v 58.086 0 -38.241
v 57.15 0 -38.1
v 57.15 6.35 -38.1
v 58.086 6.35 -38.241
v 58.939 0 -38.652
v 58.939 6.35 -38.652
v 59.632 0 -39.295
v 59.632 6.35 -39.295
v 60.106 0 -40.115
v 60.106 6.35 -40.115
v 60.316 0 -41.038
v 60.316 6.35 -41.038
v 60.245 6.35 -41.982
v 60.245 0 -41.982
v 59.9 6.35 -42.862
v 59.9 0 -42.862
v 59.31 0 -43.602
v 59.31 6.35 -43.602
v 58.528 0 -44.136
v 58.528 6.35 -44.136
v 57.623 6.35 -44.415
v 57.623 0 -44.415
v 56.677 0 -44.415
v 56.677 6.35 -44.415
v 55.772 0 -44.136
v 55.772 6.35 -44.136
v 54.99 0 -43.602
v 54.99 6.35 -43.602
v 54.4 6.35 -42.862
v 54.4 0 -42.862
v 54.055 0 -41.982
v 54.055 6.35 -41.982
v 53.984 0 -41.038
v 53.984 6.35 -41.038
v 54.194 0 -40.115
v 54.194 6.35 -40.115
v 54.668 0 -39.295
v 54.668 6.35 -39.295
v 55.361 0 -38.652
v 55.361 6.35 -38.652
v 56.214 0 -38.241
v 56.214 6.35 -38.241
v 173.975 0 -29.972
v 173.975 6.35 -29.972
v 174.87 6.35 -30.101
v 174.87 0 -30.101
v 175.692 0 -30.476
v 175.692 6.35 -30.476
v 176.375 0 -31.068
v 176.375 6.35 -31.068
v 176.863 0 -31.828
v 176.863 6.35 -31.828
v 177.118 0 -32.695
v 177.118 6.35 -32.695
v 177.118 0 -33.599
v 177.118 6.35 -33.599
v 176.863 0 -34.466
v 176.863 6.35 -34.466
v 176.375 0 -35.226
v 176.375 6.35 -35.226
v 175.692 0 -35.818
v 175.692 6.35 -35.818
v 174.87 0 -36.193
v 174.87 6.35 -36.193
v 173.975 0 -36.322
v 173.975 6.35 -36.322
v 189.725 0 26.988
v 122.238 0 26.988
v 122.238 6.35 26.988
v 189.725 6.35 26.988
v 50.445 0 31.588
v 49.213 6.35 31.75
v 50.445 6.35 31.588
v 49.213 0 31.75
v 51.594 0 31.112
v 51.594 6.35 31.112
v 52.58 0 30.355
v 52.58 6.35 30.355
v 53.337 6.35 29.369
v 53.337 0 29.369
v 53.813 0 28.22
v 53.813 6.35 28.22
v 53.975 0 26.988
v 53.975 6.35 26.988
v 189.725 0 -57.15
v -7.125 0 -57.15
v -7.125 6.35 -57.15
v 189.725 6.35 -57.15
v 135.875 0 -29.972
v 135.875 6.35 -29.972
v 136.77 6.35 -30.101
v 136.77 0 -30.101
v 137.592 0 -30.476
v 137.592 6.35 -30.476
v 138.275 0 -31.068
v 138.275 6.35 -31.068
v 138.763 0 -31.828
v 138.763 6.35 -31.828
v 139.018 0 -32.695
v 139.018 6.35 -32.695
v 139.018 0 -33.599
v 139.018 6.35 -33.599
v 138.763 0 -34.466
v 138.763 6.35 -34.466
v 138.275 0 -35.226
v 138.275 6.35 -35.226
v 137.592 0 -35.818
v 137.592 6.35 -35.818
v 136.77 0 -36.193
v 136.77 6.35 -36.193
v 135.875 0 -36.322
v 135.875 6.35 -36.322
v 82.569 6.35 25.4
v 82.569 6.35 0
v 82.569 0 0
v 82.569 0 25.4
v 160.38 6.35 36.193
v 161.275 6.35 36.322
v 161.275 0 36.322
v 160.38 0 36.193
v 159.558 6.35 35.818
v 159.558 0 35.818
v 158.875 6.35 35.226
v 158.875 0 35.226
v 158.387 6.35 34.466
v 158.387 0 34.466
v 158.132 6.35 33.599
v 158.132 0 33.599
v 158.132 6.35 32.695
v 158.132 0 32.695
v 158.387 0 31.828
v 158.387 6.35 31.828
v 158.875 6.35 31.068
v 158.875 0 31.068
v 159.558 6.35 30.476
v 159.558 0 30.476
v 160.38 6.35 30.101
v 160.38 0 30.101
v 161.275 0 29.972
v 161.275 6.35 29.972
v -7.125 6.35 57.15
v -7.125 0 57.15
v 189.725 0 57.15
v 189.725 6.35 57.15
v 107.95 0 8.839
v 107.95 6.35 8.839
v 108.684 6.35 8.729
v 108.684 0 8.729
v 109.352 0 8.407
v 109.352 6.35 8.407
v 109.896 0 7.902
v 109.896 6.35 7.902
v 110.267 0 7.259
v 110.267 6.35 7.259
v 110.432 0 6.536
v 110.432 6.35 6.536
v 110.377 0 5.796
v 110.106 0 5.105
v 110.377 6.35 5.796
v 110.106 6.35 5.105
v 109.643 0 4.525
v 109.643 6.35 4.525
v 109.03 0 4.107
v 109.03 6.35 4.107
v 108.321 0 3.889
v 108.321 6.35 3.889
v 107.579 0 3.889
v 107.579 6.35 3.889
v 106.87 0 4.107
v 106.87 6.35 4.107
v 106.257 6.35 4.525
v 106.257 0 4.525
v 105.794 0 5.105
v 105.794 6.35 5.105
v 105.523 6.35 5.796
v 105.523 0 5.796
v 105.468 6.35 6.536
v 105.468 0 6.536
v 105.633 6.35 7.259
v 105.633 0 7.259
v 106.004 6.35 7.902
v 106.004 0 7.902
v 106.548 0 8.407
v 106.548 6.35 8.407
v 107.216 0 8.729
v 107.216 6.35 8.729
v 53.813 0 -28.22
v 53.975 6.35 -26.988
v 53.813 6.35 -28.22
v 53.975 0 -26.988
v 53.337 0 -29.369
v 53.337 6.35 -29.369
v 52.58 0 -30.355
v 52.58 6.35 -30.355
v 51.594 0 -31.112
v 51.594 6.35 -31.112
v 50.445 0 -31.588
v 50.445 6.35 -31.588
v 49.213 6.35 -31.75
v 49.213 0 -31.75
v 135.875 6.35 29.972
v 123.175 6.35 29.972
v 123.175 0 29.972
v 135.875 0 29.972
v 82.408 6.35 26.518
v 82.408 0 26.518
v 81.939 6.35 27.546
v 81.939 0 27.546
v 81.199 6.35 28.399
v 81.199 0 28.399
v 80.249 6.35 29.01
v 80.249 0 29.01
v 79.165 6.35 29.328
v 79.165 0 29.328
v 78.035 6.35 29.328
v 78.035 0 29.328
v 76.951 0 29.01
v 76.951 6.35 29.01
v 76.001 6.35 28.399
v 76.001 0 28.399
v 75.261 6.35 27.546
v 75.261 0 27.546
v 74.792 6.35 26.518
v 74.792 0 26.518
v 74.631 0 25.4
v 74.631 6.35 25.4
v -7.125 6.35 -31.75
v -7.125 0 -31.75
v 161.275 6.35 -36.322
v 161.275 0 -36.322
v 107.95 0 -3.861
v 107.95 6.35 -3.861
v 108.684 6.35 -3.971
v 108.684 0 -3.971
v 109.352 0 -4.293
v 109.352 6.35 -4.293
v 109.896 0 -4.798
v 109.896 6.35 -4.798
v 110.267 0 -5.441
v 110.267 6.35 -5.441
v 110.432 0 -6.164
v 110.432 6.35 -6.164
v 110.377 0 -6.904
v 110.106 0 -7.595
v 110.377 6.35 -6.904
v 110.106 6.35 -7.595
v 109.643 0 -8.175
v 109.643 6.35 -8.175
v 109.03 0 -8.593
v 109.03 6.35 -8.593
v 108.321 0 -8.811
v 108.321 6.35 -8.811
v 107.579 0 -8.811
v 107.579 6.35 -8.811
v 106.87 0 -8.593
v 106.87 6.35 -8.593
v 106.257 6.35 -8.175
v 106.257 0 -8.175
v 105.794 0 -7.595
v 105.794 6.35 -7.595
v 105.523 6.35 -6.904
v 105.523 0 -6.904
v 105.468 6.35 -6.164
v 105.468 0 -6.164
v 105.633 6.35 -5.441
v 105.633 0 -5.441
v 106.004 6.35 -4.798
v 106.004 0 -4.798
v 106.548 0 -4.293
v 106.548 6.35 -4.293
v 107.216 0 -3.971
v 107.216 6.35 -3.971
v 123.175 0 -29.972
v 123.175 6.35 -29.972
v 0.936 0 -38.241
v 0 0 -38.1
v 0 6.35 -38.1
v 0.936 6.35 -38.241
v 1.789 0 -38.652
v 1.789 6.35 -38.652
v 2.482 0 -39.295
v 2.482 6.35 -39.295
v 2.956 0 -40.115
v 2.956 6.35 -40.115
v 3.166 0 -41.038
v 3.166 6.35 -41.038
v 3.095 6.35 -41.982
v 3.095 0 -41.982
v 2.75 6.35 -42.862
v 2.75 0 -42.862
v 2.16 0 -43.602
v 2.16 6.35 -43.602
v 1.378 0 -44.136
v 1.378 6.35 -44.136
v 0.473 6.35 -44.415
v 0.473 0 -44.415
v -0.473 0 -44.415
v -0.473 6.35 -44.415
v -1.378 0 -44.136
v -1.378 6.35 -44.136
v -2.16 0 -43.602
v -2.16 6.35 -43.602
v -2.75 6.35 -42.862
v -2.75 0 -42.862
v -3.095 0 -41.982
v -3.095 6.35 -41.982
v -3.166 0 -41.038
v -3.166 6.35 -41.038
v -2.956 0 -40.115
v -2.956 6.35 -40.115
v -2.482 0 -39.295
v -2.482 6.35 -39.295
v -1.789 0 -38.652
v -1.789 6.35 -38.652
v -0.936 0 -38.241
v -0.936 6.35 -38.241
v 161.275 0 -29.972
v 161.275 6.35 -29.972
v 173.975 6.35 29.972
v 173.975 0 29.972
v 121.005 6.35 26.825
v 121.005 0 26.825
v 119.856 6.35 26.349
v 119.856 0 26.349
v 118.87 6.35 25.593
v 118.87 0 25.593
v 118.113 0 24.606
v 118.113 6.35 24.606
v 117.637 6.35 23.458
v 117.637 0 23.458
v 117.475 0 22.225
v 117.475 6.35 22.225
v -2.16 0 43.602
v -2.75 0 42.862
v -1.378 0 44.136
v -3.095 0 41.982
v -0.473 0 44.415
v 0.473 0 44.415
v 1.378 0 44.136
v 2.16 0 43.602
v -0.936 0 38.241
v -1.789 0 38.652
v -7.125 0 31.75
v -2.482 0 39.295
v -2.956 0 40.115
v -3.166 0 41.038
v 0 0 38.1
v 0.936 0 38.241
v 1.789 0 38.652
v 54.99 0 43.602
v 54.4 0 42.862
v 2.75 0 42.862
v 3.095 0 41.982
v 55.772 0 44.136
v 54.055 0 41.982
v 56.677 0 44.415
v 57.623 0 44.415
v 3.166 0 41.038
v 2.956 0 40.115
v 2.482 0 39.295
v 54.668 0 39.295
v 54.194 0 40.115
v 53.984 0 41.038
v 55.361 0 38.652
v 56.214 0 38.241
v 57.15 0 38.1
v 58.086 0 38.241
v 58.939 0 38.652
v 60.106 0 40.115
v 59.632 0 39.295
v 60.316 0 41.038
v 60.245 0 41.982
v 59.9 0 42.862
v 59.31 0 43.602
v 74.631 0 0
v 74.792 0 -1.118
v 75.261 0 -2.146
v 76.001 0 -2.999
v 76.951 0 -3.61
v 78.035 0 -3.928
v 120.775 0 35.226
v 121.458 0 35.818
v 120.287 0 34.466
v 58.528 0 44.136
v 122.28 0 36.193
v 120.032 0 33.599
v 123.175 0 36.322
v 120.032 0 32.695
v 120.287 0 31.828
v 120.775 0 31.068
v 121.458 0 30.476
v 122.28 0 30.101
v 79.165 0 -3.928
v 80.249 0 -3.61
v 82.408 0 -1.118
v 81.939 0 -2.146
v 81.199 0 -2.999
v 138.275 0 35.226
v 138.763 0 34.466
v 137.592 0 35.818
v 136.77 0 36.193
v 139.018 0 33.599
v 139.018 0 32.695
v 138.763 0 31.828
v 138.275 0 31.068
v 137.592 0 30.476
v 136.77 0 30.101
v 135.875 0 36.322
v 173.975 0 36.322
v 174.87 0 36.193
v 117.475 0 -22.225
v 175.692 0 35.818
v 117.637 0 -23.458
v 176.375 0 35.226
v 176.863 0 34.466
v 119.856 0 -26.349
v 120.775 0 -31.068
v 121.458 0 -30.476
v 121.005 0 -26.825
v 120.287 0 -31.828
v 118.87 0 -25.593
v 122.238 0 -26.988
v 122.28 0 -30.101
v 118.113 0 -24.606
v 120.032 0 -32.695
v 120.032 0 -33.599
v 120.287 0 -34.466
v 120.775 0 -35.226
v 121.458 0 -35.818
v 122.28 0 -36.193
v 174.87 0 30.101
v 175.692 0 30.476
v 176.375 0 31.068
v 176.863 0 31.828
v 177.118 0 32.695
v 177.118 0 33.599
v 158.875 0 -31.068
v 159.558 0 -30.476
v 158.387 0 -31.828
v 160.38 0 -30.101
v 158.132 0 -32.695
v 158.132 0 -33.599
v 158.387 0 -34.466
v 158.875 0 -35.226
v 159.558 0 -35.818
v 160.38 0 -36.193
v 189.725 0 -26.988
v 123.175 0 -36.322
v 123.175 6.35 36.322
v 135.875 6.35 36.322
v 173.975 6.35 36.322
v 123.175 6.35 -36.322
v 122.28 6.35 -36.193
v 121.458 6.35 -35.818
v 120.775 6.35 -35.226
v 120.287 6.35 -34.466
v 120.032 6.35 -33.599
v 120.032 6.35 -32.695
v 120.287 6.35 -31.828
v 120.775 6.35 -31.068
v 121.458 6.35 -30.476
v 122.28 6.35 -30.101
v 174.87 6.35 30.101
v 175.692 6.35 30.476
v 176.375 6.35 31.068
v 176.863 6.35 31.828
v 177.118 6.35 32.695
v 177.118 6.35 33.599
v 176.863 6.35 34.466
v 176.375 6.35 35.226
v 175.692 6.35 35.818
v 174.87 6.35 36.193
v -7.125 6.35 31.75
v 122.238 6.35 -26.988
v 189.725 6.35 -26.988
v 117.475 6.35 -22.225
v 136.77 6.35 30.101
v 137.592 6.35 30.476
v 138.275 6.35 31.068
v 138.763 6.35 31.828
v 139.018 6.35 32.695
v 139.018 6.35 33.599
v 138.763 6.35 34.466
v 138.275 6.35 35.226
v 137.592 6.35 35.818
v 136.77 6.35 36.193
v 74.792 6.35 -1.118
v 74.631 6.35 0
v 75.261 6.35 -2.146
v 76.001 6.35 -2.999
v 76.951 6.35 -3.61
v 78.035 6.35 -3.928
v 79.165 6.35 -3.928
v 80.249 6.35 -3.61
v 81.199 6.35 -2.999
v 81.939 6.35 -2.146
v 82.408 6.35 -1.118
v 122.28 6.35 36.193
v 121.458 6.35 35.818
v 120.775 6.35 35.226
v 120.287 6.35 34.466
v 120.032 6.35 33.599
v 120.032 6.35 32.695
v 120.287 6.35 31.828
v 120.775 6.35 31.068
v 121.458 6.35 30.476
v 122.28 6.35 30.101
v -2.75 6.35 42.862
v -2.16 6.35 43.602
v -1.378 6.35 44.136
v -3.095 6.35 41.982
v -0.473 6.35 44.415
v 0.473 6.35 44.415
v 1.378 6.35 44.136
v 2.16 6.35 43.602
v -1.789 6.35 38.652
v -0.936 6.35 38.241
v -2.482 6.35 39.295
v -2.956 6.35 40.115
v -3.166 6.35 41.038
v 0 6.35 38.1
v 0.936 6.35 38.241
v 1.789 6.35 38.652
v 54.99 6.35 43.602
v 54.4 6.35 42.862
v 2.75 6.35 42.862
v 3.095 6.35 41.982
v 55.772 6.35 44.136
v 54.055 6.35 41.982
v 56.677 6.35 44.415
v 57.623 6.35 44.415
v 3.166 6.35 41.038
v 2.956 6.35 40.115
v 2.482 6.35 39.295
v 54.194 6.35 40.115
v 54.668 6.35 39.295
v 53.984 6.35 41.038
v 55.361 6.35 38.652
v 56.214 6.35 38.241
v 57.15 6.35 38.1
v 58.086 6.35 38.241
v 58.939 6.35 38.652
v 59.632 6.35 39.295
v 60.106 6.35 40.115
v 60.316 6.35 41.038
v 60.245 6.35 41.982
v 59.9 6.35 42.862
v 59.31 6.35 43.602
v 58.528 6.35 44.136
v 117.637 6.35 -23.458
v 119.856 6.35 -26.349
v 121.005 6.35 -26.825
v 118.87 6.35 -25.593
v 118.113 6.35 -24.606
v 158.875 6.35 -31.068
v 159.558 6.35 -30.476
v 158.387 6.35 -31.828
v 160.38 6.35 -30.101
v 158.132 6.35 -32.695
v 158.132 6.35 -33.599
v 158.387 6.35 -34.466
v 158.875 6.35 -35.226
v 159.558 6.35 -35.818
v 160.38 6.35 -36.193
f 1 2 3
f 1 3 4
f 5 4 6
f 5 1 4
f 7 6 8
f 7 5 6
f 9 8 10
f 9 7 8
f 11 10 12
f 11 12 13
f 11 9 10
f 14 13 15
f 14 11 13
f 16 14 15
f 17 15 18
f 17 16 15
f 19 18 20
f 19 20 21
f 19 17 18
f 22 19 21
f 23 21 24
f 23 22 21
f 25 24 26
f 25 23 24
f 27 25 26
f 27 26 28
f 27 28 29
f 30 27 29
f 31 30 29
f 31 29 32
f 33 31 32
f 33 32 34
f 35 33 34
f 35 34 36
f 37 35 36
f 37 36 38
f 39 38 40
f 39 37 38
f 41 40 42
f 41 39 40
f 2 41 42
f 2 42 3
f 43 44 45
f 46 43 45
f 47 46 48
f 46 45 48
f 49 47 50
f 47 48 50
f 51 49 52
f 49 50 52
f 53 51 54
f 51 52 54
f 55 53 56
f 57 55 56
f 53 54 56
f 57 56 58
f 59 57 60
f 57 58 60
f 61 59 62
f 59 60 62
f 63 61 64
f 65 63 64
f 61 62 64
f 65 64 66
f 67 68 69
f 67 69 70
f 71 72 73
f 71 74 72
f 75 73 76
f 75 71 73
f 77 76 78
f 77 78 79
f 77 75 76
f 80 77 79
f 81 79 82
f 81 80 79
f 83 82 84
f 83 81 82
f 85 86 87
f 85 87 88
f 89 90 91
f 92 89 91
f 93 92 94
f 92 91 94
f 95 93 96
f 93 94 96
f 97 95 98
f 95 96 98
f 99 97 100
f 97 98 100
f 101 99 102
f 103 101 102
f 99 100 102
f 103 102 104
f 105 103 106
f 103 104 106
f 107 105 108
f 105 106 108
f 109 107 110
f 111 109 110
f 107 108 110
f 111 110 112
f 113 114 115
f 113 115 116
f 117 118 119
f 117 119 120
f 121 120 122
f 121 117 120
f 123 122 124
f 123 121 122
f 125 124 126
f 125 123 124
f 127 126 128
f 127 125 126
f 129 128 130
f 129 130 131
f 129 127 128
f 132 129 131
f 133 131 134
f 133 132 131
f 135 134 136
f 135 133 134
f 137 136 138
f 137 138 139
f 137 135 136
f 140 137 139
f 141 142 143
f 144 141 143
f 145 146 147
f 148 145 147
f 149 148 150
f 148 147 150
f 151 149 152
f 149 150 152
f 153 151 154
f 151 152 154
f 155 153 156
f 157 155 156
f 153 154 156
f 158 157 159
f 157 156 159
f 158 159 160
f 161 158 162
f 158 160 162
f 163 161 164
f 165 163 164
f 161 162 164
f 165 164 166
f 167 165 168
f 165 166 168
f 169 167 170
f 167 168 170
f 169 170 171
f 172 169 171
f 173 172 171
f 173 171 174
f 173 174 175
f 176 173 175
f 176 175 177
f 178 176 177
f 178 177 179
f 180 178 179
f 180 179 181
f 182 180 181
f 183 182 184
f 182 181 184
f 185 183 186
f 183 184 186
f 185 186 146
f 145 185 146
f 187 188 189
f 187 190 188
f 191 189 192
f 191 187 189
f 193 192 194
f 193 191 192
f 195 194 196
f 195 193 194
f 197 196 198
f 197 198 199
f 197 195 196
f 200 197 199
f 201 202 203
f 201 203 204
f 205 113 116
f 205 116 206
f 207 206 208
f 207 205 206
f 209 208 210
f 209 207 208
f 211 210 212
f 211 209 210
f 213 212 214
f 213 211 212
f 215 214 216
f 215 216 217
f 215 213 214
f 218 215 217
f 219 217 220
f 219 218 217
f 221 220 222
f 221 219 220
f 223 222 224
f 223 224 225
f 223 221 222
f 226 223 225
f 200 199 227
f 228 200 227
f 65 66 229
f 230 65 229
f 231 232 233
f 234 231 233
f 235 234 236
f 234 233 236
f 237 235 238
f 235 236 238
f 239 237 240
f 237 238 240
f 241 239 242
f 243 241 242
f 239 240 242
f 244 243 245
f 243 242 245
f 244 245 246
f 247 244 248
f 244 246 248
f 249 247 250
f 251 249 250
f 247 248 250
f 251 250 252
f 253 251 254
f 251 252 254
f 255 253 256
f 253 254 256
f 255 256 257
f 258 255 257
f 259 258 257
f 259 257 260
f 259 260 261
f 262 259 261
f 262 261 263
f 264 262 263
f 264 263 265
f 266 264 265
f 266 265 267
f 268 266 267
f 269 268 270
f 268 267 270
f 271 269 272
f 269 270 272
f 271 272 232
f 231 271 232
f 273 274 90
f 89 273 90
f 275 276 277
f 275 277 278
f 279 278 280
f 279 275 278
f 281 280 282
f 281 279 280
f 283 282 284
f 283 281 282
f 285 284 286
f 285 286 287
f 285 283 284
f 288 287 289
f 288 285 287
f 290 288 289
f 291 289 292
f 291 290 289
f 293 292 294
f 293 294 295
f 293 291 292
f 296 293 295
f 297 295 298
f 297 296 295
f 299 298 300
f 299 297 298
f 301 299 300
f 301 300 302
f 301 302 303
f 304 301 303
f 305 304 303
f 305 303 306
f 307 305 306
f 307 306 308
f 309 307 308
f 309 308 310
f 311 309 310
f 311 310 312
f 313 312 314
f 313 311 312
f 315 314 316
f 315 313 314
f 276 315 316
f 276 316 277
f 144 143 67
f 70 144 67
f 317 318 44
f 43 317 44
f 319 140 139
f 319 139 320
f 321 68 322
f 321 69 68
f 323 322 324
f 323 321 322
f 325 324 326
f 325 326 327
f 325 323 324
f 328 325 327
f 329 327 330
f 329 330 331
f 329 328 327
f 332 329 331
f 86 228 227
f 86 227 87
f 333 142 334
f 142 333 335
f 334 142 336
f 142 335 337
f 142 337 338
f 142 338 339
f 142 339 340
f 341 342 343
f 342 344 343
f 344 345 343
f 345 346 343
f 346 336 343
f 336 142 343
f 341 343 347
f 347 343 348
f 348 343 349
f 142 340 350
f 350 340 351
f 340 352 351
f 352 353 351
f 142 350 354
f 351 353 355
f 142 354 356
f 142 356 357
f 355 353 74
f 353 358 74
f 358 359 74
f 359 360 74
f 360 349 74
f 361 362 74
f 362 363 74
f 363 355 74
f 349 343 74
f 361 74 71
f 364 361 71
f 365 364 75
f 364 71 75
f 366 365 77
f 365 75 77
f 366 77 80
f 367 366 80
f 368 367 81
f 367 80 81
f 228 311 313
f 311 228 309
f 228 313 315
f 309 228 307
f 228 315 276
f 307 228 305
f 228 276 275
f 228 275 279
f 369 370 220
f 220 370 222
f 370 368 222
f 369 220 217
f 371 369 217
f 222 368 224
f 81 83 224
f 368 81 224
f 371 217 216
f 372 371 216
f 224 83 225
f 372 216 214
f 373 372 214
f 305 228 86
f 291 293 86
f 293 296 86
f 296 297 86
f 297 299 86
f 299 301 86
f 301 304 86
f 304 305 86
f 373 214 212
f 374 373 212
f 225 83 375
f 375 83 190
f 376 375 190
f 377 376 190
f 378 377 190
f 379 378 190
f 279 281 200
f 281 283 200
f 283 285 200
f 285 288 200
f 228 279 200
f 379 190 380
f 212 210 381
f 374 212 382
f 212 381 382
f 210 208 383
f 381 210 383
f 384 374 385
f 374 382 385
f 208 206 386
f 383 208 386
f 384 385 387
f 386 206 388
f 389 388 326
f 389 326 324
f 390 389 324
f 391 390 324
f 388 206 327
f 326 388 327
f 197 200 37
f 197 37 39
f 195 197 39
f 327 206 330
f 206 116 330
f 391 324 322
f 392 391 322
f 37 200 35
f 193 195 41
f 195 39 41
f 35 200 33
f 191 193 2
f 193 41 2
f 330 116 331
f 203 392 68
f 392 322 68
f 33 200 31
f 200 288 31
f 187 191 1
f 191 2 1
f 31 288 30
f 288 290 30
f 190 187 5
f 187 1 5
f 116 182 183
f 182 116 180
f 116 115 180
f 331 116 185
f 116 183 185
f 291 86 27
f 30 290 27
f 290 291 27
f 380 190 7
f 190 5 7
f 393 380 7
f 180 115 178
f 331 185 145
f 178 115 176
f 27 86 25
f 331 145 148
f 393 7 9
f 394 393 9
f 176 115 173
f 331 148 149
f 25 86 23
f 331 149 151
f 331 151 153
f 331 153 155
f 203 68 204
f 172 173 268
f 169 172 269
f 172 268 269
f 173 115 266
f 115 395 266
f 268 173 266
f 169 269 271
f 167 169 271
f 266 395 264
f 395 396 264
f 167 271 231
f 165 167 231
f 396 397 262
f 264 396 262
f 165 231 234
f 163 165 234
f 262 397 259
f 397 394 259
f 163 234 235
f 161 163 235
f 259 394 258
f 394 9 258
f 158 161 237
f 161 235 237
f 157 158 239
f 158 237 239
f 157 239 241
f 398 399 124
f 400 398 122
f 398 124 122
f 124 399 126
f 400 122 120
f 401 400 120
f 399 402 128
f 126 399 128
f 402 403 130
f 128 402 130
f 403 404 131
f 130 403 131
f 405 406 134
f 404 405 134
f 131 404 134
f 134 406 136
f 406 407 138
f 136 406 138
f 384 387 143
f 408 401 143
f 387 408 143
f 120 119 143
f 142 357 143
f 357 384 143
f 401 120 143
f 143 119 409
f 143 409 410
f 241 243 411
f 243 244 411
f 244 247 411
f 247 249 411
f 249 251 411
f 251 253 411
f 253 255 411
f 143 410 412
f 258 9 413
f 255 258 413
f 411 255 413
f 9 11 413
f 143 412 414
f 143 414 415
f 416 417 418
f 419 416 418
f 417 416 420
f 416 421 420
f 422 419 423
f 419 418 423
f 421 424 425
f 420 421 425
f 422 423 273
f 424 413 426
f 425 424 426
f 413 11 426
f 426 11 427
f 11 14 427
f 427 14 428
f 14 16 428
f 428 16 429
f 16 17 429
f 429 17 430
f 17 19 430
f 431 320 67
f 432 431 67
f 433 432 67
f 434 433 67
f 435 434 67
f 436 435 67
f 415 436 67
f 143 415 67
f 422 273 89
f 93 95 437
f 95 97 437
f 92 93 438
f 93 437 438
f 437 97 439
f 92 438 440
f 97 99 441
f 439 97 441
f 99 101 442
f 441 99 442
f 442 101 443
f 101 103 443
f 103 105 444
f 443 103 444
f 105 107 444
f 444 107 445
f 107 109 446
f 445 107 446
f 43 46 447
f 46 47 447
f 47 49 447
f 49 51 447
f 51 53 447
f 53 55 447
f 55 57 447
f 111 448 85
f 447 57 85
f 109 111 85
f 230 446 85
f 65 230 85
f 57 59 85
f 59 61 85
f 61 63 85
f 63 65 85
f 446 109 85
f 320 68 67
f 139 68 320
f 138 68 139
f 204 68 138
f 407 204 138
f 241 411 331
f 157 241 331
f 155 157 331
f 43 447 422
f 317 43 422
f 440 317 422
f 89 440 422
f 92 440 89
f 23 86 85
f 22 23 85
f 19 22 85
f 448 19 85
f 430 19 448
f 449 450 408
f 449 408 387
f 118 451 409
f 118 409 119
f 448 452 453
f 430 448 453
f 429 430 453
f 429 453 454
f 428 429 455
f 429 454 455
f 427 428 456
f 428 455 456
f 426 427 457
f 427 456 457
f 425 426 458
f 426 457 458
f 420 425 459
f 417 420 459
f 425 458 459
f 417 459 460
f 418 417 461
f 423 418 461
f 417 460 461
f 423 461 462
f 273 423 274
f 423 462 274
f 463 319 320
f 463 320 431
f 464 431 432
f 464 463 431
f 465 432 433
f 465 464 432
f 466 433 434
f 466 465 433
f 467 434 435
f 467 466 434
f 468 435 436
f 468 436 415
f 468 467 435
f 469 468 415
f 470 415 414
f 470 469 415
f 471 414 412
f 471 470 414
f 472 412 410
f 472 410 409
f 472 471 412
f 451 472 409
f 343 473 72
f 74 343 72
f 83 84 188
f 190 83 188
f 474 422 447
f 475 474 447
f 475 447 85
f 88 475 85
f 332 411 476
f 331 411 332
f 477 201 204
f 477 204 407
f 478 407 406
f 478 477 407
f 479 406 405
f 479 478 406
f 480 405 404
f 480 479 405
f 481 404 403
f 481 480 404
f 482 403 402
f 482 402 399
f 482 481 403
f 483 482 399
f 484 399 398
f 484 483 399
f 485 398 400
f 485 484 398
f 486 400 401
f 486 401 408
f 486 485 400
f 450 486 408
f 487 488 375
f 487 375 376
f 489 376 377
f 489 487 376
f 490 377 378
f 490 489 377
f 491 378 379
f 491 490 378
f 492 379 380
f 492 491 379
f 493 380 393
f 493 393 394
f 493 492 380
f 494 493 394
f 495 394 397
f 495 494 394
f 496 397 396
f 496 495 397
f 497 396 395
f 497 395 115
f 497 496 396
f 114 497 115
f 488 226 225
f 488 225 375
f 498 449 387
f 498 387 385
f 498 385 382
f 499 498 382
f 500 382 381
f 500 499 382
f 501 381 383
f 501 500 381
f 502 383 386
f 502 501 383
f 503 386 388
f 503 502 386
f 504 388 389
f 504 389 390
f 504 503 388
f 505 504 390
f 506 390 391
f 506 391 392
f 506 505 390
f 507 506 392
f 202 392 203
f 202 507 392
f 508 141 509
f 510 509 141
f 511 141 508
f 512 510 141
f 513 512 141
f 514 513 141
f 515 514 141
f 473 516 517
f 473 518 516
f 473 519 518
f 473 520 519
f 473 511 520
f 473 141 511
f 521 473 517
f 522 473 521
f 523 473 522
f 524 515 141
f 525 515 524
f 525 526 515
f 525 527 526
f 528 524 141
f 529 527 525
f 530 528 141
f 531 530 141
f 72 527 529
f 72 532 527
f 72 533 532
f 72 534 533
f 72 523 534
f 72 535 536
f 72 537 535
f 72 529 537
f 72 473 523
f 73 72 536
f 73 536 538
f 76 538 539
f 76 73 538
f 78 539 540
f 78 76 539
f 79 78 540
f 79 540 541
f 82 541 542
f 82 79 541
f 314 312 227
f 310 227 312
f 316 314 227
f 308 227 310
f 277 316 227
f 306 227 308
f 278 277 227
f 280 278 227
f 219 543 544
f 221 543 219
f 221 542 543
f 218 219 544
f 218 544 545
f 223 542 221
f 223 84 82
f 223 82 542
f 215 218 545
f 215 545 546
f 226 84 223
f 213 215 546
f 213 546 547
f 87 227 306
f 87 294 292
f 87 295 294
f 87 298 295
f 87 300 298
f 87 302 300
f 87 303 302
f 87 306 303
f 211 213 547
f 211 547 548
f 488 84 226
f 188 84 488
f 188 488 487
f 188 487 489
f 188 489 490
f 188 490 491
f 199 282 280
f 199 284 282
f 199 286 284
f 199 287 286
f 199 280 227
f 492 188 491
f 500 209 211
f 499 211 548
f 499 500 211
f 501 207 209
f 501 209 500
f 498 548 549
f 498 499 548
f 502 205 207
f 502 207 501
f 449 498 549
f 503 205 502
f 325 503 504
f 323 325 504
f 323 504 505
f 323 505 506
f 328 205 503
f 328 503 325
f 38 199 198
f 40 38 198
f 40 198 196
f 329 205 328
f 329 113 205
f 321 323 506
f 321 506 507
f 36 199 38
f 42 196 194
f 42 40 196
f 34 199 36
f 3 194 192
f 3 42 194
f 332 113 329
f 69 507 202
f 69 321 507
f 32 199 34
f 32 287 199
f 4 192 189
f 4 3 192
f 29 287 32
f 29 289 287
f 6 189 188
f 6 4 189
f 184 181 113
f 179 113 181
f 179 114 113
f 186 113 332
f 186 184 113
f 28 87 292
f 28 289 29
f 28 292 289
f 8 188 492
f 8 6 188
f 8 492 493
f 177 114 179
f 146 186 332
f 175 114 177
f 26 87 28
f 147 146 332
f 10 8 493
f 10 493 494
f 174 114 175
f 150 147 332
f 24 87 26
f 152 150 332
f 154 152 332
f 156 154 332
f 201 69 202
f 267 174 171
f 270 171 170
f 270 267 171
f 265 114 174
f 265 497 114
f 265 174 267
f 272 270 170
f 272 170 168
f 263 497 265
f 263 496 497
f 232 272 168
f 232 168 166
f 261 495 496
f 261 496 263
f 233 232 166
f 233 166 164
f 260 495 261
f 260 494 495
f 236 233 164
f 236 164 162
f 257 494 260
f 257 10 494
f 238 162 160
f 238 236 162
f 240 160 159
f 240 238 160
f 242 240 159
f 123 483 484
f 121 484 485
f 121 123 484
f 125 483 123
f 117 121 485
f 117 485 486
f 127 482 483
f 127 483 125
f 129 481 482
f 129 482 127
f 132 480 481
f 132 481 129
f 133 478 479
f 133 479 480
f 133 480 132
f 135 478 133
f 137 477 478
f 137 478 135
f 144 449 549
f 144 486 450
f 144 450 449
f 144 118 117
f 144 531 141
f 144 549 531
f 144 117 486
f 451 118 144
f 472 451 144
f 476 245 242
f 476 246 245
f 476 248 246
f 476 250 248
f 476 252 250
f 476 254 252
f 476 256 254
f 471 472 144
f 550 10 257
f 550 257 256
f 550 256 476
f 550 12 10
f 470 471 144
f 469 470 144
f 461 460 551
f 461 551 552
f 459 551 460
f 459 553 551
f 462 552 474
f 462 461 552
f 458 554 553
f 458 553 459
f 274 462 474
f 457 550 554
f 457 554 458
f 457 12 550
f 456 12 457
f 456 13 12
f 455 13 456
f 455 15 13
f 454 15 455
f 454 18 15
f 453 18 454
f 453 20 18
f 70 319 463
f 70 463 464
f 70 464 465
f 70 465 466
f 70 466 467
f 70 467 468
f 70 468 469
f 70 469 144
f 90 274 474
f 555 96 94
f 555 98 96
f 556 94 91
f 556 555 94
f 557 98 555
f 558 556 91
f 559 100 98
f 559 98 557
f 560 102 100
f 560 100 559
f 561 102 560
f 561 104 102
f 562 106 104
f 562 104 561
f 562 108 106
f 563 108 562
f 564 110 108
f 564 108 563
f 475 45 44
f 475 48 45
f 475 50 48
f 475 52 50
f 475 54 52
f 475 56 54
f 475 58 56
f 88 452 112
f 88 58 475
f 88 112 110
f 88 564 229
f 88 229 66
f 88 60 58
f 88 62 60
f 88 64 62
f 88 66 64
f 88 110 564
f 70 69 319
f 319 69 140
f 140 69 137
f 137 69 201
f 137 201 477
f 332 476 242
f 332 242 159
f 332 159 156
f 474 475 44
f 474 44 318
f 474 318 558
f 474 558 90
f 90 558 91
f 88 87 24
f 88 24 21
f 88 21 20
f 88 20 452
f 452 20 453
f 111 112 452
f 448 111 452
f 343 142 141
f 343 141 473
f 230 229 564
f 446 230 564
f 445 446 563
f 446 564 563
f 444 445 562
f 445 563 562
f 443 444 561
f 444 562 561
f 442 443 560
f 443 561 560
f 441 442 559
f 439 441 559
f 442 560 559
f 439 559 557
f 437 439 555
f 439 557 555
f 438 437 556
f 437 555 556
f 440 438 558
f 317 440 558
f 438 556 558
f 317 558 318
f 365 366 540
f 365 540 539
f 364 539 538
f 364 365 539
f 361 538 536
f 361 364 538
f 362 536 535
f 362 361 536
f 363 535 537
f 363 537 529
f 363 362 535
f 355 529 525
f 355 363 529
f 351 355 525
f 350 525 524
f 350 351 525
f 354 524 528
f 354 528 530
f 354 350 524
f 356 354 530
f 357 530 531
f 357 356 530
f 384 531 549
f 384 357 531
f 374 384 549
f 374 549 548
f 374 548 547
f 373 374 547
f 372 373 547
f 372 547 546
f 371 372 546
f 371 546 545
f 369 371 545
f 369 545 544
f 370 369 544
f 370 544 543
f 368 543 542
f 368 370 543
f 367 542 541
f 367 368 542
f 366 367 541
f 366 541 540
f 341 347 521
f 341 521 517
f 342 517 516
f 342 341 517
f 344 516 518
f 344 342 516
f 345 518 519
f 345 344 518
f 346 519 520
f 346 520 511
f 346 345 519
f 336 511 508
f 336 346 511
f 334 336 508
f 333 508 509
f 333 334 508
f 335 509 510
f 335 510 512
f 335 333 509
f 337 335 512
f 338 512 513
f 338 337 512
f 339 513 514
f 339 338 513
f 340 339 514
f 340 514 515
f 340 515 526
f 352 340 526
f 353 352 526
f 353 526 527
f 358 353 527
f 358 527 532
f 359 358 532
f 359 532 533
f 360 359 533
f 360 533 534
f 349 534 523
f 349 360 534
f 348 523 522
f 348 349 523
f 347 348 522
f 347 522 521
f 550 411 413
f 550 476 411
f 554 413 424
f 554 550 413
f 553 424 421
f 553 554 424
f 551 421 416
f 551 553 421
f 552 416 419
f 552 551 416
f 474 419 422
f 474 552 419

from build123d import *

# Parameters (mm, degrees)
SKETCH1_W           = 196.85
SKETCH1_H           = 114.3
SKETCH1_R           = 3.175
BOSS_EXTRUDE1_DEPTH = 6.35
CUT_EXTRUDE1_REACH  = 200.247
SKETCH7_W           = 72.25
SKETCH7_H           = 53.975
CUT_EXTRUDE3_DEPTH  = 6.35
CUT_EXTRUDE4_DEPTH  = 6.35
FILLET1_R           = 4.7625
SKETCH10_R          = 2.4892
CUT_EXTRUDE5_DEPTH  = 6.35


with BuildPart() as part:
    # Sketch1 → Boss-Extrude1 (new body)
    with BuildSketch(Plane(origin=(0, 0, 0), x_dir=(1, 0, 0), z_dir=(0, 1, 0))):
        with Locations((91.3, 0)):
            Rectangle(SKETCH1_W, SKETCH1_H)
        with Locations((0, 41.275)):
            Circle(SKETCH1_R, mode=Mode.SUBTRACT)
        with Locations((0, -41.275)):
            Circle(SKETCH1_R, mode=Mode.SUBTRACT)
        with Locations((57.15, 41.275)):
            Circle(SKETCH1_R, mode=Mode.SUBTRACT)
        with Locations((57.15, -41.275)):
            Circle(SKETCH1_R, mode=Mode.SUBTRACT)
    extrude(amount=BOSS_EXTRUDE1_DEPTH)

    # Sketch2 → Cut-Extrude1 (cut, up to next)
    with BuildSketch(Plane(origin=(0, 6.35, 0), x_dir=(1, 0, 0), z_dir=(0, 1, 0)), mode=Mode.PRIVATE) as cut_extrude1_sk1:
        Polygon((-7.125, 0), (-7.125, -31.75), (53.975, -31.75), (53.975, 0), (53.975, 31.75), (-7.125, 31.75), align=None)
    cut_extrude1_tool1 = extrude(cut_extrude1_sk1.sketch, amount=-CUT_EXTRUDE1_REACH, mode=Mode.PRIVATE) & part.part
    add(cut_extrude1_tool1.solids().sort_by_distance((23.425, 6.35, 0))[0], mode=Mode.SUBTRACT)

    # Sketch7 → Cut-Extrude3 (cut)
    with BuildSketch(Plane.XZ):
        with Locations((153.6, 0)):
            Rectangle(SKETCH7_W, SKETCH7_H)
    extrude(amount=-CUT_EXTRUDE3_DEPTH, mode=Mode.SUBTRACT)

    # Sketch9 → Cut-Extrude4 (cut)
    with BuildSketch(Plane(origin=(0, 6.35, 0), x_dir=(1, 0, 0), z_dir=(0, 1, 0))):
        with BuildLine():
            Line((135.875, -29.972), (123.175, -29.972))
            ThreePointArc((123.175, -29.972), (120, -33.147), (123.175, -36.322))
            Line((123.175, -36.322), (135.875, -36.322))
            ThreePointArc((135.875, -36.322), (139.05, -33.147), (135.875, -29.972))
        make_face()
        with BuildLine():
            Line((161.275, -36.322), (173.975, -36.322))
            ThreePointArc((173.975, -36.322), (177.15, -33.147), (173.975, -29.972))
            Line((173.975, -29.972), (161.275, -29.972))
            ThreePointArc((161.275, -29.972), (158.1, -33.147), (161.275, -36.322))
        make_face()
        with BuildLine():
            ThreePointArc((173.975, 36.322), (177.15, 33.147), (173.975, 29.972))
            Line((173.975, 29.972), (161.275, 29.972))
            ThreePointArc((161.275, 29.972), (158.1, 33.147), (161.275, 36.322))
            Line((161.275, 36.322), (173.975, 36.322))
        make_face()
        with BuildLine():
            ThreePointArc((123.175, 29.972), (120, 33.147), (123.175, 36.322))
            Line((123.175, 36.322), (135.875, 36.322))
            ThreePointArc((135.875, 36.322), (139.05, 33.147), (135.875, 29.972))
            Line((135.875, 29.972), (123.175, 29.972))
        make_face()
        with BuildLine():
            Line((74.63125, 0), (74.63125, -25.4))
            ThreePointArc((74.63125, -25.4), (78.6, -29.36875), (82.56875, -25.4))
            Line((82.56875, -25.4), (82.56875, 0))
            ThreePointArc((82.56875, 0), (78.6, 3.96875), (74.63125, 0))
        make_face()
    extrude(amount=-CUT_EXTRUDE4_DEPTH, mode=Mode.SUBTRACT)

    # Fillet1
    fillet1_edges = [part.edges().sort_by_distance(p)[0] for p in [
        (53.975, 3.175, 31.75),
        (53.975, 3.175, -31.75),
        (117.475, 3.175, 26.9875),
        (117.475, 3.175, -26.9875),
    ]]
    fillet(fillet1_edges, radius=FILLET1_R)

    # Sketch10 → Cut-Extrude5 (cut)
    with BuildSketch(Plane(origin=(0, 6.35, 0), x_dir=(1, 0, 0), z_dir=(0, 1, 0))):
        with Locations((107.95, -6.35)):
            Circle(SKETCH10_R)
        with Locations((107.95, 6.35)):
            Circle(SKETCH10_R)
    extrude(amount=-CUT_EXTRUDE5_DEPTH, mode=Mode.SUBTRACT)


solid = part.part
